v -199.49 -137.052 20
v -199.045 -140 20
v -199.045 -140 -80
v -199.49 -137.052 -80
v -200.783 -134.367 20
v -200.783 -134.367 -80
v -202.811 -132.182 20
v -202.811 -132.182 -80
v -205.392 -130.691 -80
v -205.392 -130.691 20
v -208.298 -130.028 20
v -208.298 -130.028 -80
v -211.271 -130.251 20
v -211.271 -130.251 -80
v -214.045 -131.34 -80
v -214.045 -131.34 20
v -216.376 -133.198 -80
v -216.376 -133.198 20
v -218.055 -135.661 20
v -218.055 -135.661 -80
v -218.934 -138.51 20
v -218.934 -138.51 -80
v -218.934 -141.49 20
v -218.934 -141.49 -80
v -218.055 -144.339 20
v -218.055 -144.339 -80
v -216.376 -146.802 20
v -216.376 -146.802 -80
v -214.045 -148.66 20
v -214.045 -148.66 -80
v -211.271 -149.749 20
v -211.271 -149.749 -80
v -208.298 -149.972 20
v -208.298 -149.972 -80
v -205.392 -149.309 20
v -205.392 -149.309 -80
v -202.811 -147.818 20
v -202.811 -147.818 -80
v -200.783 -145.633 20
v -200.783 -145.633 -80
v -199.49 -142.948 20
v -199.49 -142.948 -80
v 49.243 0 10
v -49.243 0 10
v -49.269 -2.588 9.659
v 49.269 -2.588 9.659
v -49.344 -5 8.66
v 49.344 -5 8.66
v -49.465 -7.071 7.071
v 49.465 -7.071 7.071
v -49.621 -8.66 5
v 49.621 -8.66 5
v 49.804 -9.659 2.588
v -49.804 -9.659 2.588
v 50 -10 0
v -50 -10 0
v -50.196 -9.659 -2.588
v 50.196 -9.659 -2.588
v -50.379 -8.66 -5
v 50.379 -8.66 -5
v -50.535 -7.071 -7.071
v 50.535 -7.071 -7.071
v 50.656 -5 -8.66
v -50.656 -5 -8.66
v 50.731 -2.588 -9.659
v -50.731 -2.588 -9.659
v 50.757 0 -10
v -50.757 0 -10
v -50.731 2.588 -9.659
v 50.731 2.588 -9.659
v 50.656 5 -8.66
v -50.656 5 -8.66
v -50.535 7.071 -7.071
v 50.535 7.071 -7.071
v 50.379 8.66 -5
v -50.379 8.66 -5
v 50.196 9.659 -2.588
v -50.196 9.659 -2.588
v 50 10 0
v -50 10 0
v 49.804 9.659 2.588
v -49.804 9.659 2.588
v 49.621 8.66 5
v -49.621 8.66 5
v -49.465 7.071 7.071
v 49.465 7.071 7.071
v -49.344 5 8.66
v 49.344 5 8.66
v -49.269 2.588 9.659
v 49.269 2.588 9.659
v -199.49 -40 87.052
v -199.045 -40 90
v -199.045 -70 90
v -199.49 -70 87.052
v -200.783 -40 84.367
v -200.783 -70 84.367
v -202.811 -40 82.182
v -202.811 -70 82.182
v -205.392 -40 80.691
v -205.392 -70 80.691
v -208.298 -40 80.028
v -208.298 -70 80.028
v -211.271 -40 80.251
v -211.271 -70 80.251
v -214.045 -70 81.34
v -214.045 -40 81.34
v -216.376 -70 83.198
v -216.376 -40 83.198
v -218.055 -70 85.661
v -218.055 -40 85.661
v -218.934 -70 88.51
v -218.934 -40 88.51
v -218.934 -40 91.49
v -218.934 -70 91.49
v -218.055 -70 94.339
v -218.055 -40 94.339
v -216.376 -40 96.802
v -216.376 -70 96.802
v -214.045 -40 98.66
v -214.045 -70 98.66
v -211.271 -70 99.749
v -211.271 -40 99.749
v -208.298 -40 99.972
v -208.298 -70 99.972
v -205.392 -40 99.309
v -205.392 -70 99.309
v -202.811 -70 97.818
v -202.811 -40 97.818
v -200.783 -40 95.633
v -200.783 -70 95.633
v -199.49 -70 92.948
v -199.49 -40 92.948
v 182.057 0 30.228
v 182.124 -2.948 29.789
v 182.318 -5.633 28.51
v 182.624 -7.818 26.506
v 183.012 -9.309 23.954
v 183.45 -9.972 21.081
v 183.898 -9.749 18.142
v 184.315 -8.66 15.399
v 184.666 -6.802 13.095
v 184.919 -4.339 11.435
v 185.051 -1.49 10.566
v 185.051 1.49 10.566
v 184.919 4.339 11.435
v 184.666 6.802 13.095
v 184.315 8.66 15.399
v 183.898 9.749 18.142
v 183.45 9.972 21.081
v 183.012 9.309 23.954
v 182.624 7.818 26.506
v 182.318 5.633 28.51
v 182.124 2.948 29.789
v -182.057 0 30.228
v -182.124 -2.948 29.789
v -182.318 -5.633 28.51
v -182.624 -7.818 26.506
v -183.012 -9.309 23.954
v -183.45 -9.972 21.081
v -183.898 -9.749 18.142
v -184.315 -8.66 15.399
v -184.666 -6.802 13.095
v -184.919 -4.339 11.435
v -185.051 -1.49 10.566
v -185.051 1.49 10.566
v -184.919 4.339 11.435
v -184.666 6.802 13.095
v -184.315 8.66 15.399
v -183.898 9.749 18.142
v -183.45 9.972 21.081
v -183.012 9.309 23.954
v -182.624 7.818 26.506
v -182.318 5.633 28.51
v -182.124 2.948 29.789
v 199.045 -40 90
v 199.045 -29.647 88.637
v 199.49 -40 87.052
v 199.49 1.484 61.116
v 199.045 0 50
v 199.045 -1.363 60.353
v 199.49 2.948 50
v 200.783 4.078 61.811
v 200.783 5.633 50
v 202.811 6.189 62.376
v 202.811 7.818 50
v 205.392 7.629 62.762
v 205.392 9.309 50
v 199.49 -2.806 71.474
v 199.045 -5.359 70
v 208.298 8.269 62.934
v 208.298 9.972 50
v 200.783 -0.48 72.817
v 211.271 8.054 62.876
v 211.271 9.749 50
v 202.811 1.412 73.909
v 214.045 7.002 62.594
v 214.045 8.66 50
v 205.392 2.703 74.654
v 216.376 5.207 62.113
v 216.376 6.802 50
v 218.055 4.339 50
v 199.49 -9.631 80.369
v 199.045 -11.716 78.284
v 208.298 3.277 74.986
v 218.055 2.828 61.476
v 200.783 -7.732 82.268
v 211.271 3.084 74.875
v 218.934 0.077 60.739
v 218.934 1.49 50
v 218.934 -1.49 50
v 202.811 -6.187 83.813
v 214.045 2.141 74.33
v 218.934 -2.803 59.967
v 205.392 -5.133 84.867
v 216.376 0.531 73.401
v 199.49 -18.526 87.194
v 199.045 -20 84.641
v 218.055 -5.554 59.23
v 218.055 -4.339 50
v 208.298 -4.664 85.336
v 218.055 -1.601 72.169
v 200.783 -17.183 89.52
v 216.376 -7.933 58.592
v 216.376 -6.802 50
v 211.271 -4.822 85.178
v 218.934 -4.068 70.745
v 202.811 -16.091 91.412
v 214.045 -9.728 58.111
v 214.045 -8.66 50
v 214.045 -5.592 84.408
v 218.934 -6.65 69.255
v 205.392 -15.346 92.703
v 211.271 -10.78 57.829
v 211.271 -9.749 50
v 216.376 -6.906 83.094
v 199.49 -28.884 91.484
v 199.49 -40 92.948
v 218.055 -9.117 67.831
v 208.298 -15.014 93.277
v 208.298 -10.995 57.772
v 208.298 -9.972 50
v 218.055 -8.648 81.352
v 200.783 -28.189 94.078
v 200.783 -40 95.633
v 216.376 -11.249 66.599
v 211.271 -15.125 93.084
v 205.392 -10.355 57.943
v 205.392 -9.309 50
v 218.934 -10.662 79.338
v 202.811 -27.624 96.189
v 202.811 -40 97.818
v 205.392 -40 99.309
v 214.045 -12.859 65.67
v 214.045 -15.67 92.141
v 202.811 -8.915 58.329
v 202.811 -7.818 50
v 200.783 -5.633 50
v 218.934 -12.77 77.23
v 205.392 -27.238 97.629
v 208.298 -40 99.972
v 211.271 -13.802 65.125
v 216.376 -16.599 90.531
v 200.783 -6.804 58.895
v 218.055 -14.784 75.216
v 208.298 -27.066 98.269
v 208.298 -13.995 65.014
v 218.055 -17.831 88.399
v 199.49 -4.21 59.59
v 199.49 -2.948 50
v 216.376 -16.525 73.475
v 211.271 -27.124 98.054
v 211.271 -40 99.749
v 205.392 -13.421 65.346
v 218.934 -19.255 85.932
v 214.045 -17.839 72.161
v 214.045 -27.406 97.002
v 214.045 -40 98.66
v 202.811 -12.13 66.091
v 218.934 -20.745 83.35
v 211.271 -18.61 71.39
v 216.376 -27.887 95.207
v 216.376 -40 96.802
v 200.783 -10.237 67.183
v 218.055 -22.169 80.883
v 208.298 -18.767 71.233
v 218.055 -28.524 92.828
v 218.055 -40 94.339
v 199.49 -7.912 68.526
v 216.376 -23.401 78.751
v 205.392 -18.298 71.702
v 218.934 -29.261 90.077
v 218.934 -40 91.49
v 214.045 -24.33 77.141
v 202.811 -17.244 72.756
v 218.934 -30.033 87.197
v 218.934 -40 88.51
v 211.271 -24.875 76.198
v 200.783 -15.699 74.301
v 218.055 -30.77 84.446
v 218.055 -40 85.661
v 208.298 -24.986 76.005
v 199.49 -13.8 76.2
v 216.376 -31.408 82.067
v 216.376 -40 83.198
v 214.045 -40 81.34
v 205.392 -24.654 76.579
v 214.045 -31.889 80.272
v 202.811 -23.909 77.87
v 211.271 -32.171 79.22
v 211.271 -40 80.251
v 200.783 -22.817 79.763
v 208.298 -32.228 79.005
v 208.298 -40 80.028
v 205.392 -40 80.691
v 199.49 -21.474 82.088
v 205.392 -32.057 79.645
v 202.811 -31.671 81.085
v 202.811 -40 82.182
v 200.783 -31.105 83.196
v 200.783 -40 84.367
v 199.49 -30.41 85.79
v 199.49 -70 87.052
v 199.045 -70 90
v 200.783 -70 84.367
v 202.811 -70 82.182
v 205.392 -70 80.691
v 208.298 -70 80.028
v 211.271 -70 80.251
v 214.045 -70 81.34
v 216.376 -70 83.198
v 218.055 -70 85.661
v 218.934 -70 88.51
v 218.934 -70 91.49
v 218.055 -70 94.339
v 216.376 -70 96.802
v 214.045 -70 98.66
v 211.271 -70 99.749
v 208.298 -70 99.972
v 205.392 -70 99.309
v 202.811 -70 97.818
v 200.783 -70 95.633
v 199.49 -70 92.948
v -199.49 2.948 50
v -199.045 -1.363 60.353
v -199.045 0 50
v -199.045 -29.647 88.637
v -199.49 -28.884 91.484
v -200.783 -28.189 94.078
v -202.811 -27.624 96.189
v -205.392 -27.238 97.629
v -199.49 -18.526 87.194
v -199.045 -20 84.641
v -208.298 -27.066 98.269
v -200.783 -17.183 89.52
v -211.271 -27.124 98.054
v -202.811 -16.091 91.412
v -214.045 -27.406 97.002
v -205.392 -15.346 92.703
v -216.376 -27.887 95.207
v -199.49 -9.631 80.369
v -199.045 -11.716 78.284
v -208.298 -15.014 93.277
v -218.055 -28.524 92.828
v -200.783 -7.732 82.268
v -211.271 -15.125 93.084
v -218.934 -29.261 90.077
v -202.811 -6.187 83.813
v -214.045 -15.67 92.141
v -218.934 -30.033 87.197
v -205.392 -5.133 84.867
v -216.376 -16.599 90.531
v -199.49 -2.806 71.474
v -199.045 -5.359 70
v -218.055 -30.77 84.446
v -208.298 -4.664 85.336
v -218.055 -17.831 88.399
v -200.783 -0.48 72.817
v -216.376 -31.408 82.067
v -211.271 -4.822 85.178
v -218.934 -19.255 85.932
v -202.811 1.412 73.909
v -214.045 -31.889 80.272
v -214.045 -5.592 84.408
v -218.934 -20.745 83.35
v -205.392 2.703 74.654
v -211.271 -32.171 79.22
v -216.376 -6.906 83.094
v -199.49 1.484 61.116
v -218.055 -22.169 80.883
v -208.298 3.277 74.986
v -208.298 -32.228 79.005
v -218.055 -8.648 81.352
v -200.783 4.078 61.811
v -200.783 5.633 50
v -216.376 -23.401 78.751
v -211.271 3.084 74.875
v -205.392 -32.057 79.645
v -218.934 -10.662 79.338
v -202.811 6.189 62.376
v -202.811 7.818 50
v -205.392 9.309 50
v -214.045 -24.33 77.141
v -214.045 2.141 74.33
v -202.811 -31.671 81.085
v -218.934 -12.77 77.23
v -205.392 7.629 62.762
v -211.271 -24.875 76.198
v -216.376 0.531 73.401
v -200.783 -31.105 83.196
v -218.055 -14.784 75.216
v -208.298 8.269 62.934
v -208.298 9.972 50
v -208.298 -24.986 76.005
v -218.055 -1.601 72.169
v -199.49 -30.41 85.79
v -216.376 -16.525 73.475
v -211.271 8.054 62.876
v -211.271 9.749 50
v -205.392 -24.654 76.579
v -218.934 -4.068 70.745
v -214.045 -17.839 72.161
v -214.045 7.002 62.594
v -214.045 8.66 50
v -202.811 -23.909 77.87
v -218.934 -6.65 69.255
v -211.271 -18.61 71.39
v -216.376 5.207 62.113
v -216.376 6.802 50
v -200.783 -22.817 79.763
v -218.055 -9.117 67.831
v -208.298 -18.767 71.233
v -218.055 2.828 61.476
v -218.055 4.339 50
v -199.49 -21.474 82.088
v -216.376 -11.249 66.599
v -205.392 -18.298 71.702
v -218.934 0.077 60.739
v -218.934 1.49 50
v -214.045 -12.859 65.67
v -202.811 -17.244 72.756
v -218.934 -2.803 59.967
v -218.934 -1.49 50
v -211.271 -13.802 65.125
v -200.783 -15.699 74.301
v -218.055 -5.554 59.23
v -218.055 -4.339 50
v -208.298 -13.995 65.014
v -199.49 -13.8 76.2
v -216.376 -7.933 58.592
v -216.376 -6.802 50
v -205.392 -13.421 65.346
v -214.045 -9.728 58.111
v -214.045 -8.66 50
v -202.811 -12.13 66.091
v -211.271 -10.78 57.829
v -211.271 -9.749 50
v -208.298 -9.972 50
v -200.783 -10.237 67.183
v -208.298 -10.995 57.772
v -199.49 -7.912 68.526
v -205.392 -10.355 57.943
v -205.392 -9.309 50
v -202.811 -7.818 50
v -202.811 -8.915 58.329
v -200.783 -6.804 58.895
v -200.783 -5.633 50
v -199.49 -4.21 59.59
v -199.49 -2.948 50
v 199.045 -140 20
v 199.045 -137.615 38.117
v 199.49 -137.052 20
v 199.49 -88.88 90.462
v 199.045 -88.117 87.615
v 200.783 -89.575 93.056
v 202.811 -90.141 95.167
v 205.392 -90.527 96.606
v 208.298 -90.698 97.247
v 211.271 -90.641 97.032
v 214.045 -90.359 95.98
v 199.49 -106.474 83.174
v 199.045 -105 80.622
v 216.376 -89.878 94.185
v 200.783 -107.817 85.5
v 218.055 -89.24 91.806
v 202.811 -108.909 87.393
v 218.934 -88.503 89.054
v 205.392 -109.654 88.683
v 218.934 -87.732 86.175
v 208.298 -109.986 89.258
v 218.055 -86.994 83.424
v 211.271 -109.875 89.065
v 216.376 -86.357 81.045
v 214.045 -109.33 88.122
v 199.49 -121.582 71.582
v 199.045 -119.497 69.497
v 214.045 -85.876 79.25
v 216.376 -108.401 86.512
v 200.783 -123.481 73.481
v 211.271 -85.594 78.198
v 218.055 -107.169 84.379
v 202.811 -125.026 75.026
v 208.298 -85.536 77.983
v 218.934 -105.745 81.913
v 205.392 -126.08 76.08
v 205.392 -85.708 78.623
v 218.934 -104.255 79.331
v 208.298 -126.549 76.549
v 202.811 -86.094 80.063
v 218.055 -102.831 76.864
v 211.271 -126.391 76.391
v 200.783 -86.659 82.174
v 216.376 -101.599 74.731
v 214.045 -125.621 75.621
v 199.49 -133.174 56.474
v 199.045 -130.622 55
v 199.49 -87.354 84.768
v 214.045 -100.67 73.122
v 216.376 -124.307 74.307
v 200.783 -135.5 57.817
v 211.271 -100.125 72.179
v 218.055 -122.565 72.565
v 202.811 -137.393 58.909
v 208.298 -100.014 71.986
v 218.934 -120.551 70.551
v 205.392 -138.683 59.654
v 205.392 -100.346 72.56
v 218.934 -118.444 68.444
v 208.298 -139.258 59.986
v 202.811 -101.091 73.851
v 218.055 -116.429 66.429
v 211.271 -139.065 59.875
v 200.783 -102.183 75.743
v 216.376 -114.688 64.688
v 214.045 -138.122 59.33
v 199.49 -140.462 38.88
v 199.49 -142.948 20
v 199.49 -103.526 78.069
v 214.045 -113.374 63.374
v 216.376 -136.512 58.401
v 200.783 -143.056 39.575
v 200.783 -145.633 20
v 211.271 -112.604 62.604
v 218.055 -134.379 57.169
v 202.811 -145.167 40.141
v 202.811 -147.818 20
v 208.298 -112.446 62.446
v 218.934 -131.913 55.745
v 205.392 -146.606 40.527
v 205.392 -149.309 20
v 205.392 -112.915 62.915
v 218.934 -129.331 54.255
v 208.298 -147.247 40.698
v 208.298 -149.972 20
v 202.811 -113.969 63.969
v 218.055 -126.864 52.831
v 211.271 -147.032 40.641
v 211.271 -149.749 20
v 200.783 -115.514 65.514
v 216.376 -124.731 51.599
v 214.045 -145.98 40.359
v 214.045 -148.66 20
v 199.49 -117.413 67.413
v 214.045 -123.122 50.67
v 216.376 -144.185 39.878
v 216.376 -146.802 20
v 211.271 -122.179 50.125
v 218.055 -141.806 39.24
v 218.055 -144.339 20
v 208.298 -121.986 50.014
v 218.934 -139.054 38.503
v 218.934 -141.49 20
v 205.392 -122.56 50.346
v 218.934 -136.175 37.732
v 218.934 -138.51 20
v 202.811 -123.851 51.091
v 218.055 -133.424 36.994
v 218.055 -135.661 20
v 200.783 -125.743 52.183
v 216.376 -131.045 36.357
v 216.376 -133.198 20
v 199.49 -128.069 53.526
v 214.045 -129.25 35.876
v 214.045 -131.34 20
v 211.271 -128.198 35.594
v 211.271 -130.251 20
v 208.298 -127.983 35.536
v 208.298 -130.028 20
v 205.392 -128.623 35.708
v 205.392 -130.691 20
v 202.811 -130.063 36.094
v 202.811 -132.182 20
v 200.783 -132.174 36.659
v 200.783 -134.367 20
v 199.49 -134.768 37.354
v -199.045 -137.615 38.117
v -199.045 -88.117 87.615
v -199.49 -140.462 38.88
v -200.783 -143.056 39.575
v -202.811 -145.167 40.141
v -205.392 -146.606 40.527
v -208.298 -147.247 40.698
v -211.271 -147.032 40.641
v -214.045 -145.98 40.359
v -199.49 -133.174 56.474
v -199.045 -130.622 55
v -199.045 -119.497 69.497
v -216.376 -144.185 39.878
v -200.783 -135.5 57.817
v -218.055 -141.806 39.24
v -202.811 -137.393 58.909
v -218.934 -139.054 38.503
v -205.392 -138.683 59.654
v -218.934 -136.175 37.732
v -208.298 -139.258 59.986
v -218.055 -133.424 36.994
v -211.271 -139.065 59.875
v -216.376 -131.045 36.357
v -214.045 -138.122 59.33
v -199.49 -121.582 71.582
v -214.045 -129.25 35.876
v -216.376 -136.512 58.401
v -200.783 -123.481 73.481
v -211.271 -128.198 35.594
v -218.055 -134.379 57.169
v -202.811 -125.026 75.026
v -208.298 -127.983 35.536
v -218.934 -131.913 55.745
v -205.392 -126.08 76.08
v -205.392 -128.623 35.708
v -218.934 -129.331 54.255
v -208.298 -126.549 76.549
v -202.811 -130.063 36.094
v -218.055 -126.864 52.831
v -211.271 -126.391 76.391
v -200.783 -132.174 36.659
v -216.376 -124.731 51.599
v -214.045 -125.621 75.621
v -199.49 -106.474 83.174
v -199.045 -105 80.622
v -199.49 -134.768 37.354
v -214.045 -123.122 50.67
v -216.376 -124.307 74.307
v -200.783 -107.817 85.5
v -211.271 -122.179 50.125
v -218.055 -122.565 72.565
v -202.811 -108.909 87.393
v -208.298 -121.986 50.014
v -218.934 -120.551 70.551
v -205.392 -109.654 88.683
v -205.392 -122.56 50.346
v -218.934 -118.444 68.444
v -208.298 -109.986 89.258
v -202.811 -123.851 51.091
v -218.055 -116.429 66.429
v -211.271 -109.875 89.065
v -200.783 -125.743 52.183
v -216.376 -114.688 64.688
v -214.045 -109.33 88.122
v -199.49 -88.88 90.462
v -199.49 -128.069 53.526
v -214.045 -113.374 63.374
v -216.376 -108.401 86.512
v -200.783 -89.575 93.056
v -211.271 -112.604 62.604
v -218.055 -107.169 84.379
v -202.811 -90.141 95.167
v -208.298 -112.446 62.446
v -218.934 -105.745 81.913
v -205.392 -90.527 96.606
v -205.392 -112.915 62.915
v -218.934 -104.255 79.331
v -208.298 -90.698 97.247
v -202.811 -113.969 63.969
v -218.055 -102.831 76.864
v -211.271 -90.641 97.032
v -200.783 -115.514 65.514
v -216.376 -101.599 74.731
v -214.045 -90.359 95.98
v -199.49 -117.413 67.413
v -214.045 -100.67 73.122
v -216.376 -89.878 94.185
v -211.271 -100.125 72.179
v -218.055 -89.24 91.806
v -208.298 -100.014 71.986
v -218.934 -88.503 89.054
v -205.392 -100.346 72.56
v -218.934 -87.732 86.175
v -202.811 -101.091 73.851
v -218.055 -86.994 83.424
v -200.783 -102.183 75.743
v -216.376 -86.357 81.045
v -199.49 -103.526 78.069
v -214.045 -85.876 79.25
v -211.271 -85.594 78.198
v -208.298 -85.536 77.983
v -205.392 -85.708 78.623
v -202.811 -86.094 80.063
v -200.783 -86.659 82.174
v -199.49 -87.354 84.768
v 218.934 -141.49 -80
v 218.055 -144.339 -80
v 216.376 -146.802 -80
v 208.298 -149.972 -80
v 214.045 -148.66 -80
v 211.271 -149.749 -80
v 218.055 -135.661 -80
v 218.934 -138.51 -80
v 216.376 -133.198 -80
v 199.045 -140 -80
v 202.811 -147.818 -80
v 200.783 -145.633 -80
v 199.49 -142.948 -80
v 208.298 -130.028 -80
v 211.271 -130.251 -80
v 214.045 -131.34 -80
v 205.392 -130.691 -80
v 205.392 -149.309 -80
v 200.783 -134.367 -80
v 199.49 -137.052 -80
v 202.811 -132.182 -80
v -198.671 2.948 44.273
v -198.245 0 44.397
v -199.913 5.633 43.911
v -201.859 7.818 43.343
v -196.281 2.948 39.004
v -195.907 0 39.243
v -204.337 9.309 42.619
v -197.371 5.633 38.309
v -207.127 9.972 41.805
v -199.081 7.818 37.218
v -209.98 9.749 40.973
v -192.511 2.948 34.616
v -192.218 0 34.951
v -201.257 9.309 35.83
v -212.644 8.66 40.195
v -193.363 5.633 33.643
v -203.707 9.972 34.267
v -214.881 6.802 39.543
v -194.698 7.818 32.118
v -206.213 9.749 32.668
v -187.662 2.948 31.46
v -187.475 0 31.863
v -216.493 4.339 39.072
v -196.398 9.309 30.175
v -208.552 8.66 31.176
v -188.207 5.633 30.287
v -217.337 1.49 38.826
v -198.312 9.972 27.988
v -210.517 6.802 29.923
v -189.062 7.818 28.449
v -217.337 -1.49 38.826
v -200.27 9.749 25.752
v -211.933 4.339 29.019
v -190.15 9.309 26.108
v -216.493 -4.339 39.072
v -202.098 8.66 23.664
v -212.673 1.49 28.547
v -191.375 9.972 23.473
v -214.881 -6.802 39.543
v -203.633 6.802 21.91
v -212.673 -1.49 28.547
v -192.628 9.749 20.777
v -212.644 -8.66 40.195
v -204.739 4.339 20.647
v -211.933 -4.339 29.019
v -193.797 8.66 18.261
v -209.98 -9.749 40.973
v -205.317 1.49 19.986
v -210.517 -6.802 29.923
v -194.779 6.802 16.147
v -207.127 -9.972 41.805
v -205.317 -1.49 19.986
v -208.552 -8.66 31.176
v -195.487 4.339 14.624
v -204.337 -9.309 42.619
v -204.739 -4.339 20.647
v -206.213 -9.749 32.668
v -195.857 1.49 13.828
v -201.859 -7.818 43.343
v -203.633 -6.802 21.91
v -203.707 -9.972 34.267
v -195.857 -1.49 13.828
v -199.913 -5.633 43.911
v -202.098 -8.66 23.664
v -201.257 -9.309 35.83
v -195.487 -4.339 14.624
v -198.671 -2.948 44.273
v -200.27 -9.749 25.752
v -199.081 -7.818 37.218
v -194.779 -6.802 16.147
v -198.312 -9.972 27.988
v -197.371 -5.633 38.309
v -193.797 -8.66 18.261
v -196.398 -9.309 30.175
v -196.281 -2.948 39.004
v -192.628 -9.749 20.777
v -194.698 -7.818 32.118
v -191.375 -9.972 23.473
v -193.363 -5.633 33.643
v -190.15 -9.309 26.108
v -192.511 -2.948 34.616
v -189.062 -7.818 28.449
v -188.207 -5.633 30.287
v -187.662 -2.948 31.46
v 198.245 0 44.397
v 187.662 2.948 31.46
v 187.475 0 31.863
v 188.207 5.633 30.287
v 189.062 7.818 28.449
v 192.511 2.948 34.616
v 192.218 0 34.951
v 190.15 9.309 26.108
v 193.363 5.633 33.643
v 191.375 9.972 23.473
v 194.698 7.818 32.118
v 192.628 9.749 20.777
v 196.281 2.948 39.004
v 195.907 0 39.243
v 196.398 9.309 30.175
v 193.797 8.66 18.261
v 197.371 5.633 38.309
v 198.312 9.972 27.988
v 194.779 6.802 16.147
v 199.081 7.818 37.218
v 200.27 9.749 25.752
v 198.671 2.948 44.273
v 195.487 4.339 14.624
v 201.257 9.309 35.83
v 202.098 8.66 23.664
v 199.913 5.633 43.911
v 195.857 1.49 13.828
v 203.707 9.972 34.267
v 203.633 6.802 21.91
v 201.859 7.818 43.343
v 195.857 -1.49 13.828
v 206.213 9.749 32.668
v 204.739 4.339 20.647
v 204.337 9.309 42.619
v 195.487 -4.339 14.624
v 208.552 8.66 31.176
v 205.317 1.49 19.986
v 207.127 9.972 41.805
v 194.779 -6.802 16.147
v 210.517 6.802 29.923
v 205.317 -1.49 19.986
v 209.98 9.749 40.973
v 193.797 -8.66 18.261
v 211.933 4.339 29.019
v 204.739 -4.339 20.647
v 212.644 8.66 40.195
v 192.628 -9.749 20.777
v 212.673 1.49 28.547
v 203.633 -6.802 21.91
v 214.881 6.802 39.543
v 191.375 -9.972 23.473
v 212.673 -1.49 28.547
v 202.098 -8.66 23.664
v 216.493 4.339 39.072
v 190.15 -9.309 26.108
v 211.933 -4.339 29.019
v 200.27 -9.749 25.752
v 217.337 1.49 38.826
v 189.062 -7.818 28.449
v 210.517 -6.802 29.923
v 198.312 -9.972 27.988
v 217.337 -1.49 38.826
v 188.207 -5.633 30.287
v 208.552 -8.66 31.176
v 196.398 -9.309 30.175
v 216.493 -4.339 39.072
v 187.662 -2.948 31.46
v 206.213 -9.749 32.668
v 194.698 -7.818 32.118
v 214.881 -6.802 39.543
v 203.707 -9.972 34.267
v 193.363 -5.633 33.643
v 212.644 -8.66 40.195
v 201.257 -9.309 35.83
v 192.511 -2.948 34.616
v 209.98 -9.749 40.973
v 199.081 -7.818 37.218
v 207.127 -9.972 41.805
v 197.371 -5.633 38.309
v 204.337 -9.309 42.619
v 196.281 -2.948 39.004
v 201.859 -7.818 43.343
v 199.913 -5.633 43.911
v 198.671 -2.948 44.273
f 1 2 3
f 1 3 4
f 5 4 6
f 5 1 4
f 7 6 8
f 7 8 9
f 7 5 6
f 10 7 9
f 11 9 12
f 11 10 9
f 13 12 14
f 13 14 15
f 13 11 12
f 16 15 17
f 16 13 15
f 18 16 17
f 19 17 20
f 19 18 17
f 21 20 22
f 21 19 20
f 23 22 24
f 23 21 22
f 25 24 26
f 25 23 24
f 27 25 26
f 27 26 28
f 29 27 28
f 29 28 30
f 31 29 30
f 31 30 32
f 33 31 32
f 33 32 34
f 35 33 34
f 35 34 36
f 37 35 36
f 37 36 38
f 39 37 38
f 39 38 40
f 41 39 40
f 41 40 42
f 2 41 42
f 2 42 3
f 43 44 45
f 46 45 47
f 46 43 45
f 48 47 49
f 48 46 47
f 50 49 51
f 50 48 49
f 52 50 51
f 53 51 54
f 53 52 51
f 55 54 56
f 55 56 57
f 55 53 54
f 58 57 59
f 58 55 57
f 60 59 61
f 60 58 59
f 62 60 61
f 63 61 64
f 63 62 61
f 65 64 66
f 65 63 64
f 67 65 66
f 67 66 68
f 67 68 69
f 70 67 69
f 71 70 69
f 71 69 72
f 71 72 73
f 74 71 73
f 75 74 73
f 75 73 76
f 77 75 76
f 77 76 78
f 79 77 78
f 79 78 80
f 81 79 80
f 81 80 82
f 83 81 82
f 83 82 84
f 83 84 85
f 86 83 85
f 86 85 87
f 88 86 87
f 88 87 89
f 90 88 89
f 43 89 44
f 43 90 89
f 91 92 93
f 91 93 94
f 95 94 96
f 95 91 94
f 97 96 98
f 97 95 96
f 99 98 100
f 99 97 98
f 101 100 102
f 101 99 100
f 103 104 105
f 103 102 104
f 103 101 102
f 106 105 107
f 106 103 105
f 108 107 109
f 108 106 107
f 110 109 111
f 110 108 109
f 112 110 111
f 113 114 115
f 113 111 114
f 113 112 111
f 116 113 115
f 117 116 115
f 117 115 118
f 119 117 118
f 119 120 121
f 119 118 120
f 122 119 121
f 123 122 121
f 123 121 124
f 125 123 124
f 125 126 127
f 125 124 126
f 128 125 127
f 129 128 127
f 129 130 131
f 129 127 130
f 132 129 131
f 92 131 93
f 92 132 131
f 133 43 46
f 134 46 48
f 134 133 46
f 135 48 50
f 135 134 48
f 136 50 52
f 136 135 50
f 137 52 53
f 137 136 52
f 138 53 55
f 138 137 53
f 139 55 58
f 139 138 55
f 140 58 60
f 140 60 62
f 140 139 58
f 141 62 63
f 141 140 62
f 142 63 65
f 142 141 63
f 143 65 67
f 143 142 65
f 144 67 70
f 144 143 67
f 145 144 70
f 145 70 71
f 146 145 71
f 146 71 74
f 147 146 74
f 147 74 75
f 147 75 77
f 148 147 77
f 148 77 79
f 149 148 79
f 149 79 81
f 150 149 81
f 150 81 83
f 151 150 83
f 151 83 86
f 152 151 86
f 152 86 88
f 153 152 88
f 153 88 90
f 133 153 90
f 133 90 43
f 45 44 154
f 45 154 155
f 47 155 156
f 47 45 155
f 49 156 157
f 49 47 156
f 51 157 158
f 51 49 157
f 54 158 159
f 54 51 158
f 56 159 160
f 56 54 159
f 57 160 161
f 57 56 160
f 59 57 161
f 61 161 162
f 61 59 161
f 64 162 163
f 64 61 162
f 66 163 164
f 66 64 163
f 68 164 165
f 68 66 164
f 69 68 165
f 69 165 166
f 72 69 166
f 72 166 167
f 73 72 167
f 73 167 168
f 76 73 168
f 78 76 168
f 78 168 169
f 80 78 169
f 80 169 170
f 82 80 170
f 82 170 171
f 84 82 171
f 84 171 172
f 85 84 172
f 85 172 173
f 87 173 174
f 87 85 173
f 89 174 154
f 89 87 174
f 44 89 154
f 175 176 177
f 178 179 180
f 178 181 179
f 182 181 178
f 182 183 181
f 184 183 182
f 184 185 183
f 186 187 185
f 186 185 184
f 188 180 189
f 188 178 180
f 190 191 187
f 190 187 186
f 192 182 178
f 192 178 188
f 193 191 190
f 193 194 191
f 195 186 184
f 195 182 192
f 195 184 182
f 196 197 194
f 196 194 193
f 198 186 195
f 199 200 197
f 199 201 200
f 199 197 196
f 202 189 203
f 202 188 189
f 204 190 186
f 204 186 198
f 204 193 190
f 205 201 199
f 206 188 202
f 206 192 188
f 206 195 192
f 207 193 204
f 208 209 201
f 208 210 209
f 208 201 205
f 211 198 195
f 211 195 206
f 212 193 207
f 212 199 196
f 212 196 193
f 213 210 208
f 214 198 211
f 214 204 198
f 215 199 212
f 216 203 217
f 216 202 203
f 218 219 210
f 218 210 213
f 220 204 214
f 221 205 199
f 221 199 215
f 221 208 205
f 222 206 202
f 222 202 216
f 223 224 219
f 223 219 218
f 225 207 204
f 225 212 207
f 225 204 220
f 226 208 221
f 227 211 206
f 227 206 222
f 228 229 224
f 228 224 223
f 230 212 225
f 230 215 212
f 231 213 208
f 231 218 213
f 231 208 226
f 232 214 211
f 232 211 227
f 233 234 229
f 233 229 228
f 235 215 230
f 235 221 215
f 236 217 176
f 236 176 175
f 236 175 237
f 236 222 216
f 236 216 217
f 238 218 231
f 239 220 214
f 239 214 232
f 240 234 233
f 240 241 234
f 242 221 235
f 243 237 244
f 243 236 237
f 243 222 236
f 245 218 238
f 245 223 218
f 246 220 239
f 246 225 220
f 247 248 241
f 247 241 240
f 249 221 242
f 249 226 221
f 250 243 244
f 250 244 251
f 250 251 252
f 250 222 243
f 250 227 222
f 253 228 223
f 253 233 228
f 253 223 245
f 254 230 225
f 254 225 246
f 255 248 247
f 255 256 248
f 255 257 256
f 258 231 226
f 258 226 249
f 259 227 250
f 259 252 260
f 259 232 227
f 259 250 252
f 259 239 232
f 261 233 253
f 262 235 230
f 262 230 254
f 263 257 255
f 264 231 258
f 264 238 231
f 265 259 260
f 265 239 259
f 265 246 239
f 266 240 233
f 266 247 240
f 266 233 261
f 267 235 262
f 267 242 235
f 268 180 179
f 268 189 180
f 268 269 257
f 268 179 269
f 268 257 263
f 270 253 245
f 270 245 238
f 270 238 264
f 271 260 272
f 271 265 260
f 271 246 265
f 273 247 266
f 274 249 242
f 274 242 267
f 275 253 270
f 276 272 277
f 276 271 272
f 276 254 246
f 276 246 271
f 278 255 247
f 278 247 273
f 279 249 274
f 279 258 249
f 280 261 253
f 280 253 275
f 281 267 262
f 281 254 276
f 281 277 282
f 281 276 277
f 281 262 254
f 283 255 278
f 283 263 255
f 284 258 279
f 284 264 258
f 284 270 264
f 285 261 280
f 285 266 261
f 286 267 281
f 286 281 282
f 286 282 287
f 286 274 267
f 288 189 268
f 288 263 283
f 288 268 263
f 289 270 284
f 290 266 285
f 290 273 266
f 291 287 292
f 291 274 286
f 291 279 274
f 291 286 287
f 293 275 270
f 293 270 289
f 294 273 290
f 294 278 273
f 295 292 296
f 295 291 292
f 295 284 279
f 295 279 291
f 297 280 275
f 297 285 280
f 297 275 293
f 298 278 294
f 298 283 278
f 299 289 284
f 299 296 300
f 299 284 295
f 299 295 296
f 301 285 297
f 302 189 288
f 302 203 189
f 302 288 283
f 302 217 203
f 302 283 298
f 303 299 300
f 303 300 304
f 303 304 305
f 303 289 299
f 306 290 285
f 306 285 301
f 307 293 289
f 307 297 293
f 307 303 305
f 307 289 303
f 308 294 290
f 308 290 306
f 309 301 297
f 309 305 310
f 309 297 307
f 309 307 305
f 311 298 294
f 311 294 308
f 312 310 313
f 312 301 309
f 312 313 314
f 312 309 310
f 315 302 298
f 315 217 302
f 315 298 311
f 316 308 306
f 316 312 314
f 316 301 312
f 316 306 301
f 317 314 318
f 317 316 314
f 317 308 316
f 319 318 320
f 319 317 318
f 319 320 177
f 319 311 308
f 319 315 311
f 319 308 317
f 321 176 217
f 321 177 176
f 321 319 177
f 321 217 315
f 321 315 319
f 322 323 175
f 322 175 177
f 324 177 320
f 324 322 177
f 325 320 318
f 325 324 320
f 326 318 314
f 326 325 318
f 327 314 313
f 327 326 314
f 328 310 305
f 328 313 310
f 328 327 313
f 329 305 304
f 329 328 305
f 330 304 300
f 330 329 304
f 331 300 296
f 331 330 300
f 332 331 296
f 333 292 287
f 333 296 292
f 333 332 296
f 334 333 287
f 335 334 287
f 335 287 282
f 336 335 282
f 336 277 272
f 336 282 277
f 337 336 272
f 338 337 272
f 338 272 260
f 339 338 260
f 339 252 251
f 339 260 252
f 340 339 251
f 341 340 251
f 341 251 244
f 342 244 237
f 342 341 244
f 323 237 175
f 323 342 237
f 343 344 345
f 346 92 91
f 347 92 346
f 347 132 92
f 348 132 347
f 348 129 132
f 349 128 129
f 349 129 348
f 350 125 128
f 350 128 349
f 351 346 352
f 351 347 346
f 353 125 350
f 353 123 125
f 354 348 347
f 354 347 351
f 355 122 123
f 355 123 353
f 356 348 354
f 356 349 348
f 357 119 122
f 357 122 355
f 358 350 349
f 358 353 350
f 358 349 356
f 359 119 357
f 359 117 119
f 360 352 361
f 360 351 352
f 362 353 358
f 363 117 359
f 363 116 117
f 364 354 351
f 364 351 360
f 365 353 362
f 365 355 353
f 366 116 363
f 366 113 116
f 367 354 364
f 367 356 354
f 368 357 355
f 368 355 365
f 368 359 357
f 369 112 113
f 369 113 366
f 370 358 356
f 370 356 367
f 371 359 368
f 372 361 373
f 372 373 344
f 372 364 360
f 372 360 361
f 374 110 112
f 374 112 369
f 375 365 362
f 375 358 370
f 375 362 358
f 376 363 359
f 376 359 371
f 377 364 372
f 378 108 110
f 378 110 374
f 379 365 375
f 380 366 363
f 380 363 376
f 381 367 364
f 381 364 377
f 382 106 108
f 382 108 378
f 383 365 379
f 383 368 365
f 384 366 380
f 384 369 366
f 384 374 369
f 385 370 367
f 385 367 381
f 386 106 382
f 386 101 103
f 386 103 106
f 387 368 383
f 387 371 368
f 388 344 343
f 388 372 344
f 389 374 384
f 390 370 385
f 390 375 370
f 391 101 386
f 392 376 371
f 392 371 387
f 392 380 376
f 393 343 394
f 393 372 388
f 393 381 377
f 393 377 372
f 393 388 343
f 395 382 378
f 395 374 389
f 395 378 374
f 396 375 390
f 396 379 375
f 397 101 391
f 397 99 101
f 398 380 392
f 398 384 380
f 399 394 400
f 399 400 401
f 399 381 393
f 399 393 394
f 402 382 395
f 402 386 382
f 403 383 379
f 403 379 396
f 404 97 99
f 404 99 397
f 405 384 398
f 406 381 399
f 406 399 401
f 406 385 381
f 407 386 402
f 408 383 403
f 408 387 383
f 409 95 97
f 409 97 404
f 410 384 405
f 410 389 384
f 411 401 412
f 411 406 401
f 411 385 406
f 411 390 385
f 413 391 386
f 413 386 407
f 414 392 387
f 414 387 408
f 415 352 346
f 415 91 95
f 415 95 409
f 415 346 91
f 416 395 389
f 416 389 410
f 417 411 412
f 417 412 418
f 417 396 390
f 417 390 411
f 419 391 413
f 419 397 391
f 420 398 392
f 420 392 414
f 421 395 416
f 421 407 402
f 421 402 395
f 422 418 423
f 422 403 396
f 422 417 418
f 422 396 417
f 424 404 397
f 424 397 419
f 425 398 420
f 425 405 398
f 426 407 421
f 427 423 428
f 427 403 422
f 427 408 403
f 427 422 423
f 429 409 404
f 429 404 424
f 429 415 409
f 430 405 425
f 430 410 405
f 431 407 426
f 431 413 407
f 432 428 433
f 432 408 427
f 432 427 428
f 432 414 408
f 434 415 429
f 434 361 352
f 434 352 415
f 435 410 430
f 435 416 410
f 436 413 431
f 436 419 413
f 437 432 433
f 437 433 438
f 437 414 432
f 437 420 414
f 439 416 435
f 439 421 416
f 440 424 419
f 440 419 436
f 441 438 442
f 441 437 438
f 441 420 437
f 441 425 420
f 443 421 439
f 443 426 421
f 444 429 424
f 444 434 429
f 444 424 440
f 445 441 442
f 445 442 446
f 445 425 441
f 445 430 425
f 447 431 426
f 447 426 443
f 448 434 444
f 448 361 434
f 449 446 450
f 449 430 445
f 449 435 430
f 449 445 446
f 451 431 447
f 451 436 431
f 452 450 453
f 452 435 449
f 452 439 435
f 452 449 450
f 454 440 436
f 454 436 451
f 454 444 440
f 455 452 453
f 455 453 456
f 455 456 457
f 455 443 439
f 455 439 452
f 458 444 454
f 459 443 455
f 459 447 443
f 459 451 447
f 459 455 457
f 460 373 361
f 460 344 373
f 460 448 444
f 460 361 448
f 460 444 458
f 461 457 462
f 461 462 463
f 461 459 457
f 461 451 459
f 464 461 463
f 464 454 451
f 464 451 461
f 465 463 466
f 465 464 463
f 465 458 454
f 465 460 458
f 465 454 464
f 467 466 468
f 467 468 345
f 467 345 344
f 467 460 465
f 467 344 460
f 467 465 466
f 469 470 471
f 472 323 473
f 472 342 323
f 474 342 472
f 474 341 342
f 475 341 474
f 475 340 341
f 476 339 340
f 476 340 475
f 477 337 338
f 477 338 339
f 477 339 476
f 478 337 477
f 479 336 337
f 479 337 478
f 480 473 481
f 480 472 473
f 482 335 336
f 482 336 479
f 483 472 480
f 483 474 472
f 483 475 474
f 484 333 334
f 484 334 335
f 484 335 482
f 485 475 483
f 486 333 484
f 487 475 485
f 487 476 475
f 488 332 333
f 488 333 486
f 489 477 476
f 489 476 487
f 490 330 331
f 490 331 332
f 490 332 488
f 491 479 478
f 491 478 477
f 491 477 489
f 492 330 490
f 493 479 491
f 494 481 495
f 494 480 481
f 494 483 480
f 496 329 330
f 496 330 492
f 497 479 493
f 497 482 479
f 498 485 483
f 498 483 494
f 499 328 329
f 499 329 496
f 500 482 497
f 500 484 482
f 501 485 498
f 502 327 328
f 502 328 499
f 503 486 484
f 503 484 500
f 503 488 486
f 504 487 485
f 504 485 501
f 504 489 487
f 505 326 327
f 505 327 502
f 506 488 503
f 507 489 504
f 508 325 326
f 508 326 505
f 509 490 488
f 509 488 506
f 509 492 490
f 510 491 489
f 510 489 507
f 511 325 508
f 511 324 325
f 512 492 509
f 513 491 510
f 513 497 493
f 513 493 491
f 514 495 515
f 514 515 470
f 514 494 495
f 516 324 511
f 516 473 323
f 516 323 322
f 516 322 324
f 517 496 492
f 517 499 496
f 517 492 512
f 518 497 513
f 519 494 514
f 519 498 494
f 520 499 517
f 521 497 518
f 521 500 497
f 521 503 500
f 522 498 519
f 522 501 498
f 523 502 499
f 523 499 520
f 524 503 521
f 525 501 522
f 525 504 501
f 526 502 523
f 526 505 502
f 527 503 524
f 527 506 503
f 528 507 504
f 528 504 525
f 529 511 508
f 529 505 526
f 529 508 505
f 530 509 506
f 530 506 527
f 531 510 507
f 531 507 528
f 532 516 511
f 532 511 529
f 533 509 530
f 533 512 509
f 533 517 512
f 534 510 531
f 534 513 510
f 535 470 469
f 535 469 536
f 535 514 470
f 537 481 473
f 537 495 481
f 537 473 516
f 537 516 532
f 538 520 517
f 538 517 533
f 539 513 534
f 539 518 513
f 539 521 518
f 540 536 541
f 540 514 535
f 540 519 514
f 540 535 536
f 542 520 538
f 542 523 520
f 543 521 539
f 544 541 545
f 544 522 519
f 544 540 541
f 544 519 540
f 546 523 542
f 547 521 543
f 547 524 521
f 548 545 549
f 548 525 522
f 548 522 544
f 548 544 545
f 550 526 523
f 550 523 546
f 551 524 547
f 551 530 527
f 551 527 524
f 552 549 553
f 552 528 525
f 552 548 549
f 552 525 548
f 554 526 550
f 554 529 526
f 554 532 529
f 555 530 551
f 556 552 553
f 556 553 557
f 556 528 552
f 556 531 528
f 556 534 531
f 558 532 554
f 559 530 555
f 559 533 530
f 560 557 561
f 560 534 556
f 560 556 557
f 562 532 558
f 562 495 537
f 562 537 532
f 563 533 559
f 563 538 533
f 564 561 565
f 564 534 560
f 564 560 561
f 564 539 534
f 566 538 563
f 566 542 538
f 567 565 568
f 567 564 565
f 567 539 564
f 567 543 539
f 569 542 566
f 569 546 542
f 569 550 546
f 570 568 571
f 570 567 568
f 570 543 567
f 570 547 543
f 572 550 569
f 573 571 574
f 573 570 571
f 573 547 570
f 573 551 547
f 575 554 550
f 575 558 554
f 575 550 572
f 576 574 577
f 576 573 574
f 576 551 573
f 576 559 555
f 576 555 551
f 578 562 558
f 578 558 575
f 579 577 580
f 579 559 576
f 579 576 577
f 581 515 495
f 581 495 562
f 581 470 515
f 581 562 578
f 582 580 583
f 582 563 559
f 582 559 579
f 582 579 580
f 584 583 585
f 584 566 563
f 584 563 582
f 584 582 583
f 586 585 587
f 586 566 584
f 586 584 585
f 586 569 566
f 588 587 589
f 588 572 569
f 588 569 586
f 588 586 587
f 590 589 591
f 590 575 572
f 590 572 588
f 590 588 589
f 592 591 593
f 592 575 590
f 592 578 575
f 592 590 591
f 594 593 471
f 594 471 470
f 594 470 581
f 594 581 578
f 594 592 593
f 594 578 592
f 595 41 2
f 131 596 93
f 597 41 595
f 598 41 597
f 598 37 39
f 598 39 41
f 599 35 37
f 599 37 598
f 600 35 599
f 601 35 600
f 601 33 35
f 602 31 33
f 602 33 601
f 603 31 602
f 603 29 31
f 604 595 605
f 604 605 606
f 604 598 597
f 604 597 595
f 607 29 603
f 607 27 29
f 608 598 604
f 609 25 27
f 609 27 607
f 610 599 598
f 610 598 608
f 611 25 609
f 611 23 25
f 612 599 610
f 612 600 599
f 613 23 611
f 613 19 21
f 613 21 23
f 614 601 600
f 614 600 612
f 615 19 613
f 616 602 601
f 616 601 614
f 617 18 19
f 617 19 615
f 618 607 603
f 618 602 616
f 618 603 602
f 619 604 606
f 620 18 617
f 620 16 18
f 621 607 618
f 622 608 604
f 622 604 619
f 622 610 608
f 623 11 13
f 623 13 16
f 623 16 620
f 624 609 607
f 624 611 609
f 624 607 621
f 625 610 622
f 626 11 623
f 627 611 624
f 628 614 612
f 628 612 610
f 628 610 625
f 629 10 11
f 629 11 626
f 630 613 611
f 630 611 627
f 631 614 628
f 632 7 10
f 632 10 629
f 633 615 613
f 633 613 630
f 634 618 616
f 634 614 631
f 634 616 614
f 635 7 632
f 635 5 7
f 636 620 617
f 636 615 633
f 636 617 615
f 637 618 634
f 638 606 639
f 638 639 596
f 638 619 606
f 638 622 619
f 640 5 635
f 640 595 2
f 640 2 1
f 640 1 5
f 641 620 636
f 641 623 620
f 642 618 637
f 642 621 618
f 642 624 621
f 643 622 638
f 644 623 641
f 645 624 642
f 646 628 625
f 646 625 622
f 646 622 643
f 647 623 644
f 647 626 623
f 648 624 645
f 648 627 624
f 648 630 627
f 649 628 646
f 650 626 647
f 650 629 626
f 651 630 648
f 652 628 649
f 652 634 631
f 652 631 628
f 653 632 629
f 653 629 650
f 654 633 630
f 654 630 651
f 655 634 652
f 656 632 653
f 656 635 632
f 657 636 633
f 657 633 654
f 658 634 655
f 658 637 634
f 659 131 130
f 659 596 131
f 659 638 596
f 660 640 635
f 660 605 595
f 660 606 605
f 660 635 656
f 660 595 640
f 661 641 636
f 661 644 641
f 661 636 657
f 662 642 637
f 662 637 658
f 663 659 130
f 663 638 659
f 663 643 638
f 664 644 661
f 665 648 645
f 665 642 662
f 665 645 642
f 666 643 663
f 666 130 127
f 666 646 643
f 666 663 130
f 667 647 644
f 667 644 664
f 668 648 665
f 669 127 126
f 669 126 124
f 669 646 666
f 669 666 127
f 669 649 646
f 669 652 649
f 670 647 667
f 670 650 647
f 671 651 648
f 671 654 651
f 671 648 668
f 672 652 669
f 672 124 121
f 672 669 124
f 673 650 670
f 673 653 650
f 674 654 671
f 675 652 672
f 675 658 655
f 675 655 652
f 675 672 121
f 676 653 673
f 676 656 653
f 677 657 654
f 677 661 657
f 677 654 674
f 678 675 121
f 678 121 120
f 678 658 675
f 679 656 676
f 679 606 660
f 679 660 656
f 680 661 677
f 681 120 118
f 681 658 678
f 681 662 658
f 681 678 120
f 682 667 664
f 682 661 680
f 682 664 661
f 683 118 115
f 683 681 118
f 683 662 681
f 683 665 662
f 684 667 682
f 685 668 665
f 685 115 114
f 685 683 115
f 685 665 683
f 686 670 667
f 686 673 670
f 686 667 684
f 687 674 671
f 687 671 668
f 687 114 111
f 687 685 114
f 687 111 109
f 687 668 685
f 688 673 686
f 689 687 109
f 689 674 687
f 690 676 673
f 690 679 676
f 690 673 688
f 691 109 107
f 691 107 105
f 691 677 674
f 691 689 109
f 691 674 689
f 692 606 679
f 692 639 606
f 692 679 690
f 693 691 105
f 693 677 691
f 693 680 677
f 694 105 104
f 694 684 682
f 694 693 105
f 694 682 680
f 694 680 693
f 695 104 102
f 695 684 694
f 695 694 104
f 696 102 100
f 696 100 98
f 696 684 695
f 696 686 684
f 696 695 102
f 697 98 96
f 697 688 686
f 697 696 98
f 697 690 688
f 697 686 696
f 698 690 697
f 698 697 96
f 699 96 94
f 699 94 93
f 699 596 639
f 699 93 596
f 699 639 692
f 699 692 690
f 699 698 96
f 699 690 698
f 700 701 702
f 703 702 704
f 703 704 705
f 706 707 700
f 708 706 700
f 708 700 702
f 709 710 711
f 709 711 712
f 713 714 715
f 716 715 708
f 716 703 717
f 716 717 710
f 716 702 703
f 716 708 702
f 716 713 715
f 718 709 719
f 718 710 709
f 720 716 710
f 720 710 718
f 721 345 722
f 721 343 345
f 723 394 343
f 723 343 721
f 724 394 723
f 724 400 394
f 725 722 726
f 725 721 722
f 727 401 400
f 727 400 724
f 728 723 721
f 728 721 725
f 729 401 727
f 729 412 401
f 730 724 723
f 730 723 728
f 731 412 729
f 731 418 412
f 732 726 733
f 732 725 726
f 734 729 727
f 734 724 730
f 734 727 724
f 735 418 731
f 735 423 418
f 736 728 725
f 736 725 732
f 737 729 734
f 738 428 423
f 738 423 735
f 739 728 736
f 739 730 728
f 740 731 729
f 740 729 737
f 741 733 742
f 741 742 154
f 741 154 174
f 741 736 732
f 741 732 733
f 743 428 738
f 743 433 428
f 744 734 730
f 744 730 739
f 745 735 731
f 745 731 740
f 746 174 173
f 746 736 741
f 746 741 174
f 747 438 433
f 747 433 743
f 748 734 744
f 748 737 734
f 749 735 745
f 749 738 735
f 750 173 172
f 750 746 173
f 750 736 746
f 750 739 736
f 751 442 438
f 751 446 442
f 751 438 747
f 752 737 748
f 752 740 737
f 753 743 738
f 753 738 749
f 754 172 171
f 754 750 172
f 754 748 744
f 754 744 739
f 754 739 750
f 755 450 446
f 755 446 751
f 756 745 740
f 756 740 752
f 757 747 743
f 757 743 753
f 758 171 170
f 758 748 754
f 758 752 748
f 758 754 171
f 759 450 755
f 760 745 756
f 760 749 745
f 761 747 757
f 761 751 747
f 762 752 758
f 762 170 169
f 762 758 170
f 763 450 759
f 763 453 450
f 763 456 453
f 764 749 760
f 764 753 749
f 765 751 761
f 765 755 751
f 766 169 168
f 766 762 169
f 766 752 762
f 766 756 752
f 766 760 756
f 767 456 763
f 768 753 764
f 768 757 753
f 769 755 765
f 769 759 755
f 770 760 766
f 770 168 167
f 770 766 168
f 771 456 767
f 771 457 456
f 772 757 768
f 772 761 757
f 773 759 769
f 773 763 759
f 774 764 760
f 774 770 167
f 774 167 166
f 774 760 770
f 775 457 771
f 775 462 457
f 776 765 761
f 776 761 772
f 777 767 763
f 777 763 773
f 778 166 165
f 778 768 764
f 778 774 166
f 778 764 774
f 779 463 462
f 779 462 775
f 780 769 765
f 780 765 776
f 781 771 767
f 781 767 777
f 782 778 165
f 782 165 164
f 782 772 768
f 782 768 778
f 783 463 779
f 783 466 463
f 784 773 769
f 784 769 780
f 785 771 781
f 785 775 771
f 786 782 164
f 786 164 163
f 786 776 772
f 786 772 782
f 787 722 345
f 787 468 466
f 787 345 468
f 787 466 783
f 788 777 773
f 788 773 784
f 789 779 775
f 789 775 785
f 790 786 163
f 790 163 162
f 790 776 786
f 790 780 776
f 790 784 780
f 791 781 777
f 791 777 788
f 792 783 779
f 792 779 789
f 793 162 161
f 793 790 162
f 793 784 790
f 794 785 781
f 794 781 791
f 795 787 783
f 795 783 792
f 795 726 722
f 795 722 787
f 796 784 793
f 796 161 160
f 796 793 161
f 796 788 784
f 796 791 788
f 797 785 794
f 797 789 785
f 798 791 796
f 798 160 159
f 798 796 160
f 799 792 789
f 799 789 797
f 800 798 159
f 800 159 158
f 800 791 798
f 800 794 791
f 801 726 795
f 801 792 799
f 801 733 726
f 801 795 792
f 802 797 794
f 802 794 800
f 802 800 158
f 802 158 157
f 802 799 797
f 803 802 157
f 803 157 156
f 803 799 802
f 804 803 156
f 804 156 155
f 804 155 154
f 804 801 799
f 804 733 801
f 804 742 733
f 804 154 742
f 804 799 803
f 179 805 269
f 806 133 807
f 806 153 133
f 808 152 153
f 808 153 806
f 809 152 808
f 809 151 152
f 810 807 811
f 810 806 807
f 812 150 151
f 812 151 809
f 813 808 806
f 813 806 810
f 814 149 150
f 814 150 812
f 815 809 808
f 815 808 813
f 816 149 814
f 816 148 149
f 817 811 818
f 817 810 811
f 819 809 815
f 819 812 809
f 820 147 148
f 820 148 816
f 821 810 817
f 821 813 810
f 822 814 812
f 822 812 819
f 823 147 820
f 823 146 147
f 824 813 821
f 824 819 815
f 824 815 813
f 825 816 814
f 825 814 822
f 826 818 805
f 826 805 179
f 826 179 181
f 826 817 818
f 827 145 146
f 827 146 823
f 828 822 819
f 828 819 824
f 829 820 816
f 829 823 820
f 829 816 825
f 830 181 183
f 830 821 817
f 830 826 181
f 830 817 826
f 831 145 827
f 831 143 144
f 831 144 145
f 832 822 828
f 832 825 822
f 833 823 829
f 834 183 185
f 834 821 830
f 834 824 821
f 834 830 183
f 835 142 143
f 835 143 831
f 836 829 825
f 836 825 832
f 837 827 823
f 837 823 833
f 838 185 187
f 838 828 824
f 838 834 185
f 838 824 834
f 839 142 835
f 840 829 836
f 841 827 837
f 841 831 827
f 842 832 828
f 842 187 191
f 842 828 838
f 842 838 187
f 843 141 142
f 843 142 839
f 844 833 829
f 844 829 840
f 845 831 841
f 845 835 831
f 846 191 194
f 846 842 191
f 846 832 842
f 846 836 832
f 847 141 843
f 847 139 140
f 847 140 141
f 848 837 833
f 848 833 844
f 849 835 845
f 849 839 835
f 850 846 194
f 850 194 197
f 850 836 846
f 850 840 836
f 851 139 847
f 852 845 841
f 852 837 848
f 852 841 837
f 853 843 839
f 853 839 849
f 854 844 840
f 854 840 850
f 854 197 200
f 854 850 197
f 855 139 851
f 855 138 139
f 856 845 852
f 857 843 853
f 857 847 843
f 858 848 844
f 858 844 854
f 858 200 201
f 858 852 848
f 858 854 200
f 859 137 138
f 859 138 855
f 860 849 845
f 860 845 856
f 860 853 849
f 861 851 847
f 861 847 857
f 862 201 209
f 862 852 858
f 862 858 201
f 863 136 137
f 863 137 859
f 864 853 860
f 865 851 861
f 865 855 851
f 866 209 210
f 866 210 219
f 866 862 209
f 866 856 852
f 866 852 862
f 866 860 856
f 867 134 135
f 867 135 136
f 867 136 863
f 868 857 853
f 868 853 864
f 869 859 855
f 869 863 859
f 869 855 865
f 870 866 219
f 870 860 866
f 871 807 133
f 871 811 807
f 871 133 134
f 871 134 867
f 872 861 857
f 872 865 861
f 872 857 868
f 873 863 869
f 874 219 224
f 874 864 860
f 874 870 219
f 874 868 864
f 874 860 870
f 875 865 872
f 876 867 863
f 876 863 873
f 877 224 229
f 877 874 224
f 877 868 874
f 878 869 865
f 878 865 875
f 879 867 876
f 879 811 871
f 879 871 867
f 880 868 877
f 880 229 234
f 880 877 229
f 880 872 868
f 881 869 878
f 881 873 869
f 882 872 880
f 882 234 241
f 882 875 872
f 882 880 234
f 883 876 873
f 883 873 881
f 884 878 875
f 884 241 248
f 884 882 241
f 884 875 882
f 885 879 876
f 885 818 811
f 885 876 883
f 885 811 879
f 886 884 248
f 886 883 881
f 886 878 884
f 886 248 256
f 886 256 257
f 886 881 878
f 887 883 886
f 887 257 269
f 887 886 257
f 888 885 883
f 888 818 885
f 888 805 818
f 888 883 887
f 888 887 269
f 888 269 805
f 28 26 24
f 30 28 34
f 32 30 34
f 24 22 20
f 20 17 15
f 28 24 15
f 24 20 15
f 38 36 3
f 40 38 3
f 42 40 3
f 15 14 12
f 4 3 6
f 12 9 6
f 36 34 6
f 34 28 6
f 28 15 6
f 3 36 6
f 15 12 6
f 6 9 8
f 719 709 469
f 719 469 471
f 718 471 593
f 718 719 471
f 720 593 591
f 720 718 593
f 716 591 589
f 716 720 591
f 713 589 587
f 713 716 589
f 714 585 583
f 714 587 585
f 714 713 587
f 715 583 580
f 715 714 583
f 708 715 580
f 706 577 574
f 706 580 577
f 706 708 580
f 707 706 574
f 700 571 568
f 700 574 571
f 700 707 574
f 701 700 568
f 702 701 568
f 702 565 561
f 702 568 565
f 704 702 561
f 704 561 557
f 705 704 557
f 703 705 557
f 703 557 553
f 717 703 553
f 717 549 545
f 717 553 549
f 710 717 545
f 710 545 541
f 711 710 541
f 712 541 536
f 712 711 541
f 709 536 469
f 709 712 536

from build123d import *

# Parameters (mm, degrees)
SKETCH1_R = 10


with BuildPart() as part:
    # Sweep1: sweep along a curve in space
    with BuildLine() as sweep1_path:
        Line((209.045449604, -140, 20), (209.045449604, -140, -80))
        ThreePointArc((209.045449604, -70, 90), (209.045449604, -119.497474683, 69.497474683), (209.045449604, -140, 20))
        Line((209.045449604, -40, 90), (209.045449604, -70, 90))
        ThreePointArc((209.045449604, 0, 50), (209.045449604, -11.715728753, 78.284271247), (209.045449604, -40, 90))
        ThreePointArc((183.562460513, 0, 20.342005927), (201.799683575, 0, 30.448917259), (209.045449604, 0, 50))
        Line((50, 0, 0), (183.562460513, 0, 20.342005927))
        Line((-50, 0, 0), (50, 0, 0))
        Line((-50, 0, 0), (-183.562460513, 0, 20.342005927))
        ThreePointArc((-209.045449604, 0, 50), (-201.799683575, 0, 30.448917259), (-183.562460513, 0, 20.342005927))
        ThreePointArc((-209.045449604, -40, 90), (-209.045449604, -11.715728753, 78.284271247), (-209.045449604, 0, 50))
        Line((-209.045449604, -40, 90), (-209.045449604, -70, 90))
        ThreePointArc((-209.045449604, -140, 20), (-209.045449604, -119.497474683, 69.497474683), (-209.045449604, -70, 90))
        Line((-209.045449604, -140, 20), (-209.045449604, -140, -80))
    # Sketch1 → Sweep1 (sweep)
    with BuildSketch(Plane.XY.offset(-80)):
        with Locations((-209.045449604, -140)):
            Circle(SKETCH1_R)
    sweep(path=sweep1_path.line, transition=Transition.RIGHT)


solid = part.part
